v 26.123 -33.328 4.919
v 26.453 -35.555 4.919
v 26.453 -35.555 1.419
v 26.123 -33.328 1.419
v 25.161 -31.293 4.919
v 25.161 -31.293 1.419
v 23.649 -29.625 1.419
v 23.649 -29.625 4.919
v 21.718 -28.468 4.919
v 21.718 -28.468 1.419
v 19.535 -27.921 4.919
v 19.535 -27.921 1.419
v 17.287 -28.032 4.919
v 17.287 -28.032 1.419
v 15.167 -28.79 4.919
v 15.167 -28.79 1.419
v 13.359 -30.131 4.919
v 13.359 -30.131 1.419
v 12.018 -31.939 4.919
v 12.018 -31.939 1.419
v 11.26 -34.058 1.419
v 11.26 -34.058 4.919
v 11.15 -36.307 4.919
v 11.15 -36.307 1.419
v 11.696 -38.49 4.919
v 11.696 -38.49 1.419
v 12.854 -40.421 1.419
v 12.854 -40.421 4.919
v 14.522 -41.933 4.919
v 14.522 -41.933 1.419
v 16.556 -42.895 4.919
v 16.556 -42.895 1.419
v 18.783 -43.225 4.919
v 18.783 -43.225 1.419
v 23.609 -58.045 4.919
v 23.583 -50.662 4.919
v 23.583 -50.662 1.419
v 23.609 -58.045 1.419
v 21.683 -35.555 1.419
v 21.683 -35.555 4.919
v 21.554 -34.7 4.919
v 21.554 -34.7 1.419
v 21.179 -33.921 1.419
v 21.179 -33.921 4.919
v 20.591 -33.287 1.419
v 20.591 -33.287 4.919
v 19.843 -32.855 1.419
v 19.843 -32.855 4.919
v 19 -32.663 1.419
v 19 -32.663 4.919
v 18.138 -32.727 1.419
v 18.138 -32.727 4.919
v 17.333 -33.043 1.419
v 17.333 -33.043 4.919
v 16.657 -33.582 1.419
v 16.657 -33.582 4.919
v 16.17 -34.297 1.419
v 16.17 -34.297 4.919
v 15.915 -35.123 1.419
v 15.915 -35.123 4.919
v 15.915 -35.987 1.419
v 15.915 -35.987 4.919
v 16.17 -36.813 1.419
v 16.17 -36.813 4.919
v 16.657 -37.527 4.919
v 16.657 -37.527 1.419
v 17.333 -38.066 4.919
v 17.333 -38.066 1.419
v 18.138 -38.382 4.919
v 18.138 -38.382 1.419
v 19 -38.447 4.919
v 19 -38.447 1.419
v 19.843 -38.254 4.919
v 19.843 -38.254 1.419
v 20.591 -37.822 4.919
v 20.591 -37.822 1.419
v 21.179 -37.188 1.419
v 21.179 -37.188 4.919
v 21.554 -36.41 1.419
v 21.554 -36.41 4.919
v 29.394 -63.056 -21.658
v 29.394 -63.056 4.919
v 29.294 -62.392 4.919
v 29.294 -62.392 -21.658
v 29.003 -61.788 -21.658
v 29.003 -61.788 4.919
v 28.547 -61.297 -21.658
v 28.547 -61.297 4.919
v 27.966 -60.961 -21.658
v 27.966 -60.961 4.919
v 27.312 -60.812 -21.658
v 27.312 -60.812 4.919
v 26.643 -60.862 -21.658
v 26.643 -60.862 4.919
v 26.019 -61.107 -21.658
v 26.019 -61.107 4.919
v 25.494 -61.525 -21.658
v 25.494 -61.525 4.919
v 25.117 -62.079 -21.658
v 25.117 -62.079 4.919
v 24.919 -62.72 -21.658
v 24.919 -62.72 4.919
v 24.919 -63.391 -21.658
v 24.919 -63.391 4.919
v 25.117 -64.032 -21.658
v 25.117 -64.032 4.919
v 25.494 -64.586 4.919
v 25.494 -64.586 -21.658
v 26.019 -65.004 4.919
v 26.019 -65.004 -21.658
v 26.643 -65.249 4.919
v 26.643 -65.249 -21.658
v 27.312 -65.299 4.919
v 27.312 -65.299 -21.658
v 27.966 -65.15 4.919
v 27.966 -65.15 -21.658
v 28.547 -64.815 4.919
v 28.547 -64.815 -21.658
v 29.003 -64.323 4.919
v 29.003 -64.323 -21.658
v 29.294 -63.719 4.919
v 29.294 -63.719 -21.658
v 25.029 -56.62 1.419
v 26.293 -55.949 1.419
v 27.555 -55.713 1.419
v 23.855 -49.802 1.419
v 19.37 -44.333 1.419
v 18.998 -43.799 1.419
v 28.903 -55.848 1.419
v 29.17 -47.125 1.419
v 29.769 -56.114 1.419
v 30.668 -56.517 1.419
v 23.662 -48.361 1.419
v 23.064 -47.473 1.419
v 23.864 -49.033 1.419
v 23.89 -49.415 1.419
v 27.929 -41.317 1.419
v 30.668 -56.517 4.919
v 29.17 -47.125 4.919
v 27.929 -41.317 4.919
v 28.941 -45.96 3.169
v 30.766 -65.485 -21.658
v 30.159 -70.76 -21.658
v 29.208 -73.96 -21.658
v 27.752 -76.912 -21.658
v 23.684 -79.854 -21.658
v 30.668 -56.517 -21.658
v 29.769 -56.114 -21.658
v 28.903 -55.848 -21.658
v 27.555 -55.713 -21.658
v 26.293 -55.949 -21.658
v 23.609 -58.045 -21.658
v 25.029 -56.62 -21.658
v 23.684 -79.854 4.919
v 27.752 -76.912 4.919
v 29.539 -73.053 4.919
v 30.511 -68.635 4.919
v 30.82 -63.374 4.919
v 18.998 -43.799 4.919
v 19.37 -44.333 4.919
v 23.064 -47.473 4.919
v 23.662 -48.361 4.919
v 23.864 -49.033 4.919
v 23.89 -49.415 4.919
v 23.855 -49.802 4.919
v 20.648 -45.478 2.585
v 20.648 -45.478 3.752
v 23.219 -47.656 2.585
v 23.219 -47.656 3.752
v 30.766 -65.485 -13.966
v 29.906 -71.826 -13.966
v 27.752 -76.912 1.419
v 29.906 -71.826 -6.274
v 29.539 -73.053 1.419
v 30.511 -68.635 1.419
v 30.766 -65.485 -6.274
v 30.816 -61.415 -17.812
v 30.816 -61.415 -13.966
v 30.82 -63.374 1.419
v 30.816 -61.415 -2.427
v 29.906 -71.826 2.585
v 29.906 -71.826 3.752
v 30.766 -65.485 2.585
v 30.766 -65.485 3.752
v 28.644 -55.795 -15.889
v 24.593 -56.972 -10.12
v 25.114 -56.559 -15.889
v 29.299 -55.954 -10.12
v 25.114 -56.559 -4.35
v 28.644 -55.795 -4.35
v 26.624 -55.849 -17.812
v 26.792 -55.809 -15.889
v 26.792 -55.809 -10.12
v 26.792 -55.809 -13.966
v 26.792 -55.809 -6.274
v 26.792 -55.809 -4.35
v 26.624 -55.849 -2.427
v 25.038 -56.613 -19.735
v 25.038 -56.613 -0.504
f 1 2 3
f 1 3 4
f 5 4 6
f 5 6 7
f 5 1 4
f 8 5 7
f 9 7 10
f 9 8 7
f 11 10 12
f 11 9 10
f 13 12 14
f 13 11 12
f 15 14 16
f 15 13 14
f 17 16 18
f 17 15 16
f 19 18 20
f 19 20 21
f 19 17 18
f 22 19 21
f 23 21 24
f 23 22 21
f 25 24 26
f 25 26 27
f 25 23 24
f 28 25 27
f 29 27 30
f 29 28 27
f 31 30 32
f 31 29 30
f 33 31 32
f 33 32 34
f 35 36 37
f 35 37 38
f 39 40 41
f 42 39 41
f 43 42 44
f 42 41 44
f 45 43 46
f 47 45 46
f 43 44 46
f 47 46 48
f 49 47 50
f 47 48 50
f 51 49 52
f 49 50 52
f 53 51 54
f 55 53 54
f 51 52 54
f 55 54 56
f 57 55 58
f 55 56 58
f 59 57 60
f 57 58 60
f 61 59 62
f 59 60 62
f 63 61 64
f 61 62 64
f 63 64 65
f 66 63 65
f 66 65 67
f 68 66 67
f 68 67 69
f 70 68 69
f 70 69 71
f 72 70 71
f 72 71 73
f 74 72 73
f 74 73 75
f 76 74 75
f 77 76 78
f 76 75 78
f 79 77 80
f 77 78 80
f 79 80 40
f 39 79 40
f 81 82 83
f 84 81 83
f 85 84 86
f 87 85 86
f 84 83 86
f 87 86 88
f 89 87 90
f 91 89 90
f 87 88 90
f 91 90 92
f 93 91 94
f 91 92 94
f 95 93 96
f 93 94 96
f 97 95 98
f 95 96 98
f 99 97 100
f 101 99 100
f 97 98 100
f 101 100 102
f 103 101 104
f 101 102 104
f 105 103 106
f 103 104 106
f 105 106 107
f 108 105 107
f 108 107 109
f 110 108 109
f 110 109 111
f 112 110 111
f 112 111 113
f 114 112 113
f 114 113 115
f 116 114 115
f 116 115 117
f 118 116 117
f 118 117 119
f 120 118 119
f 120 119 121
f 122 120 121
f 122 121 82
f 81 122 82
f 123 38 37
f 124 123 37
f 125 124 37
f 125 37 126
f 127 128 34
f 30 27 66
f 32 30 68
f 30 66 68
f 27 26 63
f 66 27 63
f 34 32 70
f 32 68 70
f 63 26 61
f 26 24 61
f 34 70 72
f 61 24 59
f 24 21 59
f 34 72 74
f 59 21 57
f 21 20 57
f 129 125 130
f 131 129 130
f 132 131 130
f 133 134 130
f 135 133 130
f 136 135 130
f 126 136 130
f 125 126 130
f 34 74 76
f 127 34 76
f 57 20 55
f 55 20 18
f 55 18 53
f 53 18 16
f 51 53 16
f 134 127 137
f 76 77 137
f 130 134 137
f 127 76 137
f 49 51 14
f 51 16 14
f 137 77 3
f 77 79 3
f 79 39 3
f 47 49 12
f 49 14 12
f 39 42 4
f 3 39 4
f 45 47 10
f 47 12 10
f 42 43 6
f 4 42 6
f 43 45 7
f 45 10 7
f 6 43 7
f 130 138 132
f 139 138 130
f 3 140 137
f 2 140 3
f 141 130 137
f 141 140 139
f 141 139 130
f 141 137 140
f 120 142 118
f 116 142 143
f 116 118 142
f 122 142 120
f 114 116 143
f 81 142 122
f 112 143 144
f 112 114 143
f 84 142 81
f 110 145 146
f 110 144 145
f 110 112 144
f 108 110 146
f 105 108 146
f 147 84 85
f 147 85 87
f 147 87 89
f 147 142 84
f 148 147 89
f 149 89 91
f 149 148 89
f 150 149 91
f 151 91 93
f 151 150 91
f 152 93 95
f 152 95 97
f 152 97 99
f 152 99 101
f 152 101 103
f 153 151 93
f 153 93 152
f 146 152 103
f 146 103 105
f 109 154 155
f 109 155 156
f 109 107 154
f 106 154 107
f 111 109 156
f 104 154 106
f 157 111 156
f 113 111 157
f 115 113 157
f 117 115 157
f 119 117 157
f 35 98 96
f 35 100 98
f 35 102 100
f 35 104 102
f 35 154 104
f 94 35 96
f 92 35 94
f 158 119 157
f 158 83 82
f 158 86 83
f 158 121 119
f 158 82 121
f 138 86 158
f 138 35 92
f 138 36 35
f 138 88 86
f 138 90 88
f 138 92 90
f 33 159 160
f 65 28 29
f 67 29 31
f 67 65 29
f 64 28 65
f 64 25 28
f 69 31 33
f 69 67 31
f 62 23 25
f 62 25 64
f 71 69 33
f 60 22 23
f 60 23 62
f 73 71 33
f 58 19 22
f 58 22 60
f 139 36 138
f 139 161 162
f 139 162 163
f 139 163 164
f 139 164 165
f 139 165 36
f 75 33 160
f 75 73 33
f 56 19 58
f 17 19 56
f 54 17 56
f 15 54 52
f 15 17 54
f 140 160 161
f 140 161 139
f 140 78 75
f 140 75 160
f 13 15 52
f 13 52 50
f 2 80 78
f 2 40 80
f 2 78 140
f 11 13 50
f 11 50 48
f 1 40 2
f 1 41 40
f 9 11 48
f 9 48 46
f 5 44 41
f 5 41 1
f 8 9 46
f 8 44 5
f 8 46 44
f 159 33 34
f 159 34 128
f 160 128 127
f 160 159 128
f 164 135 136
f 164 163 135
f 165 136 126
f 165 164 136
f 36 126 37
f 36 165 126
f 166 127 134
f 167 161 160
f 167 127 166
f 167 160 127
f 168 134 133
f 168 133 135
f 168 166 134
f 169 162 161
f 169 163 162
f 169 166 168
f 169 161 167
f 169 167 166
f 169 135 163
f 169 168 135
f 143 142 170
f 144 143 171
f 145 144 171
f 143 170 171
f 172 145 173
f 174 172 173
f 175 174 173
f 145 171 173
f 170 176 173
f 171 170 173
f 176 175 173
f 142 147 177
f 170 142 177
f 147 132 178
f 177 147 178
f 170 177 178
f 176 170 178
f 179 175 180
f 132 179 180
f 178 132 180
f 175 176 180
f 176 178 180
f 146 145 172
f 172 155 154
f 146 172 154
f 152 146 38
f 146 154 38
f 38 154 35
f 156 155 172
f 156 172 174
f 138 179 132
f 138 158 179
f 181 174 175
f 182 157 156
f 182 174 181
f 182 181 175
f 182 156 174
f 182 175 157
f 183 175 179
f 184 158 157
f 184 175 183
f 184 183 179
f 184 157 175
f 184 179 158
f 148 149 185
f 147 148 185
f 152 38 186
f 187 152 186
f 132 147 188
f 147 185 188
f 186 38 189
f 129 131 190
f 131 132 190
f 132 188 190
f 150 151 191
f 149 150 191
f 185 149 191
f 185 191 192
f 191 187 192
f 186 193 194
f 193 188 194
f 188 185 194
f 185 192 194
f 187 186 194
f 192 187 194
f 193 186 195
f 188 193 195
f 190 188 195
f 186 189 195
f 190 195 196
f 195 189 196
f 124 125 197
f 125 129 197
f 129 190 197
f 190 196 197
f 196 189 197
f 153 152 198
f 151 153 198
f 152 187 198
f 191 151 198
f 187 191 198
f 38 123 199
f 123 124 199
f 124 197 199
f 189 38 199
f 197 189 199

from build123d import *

# Parameters (mm, degrees)
SKETCH1_R           = 2.9
BOSS_EXTRUDE1_DEPTH = 3.5
BOSS_EXTRUDE2_DEPTH = 23.076867
SKETCH3_R           = 2.25
CUT_EXTRUDE1_DEPTH  = 90.627435024


with BuildPart() as part:
    # Sketch1 → Boss-Extrude1 (new body)
    with BuildSketch(Plane.XY.offset(4.918735516)):
        with BuildLine():
            Line((23.684222564, -79.854061858), (27.751665024, -76.911614194))
            add(Edge.make_bspline(
                [(27.751665024, -76.911614194), (30.665612651, -71.996437575), (31.13217948, -67.256532156), (30.668059578, -56.517089881)],
                knots=[0.222415535, 0.222415535, 0.222415535, 0.222415535, 0.766682965, 0.766682965, 0.766682965, 0.766682965], degree=3))
            add(Edge.make_bspline(
                [(30.668059578, -56.517089881), (29.320428981, -45.88374403), (26.453494832, -35.554786486)],
                knots=[0, 0, 0, 1, 1, 1], degree=2))
            ThreePointArc((26.453494832, -35.554786486), (13.359197662, -30.130951008), (18.783033139, -43.225248178))
            add(Edge.make_bspline(
                [(18.783033139, -43.225248178), (19.322772584, -45.817228322), (25.294082339, -46.94058971), (23.583083134, -50.662102957)],
                knots=[0, 0, 0, 0, 1, 1, 1, 1], degree=3))
            Line((23.583083134, -50.662102957), (23.608661583, -58.04483203))
            Line((23.608661583, -58.04483203), (23.684222564, -79.854061858))
        make_face()
        with Locations((18.783033139, -35.554786486)):
            Circle(SKETCH1_R, mode=Mode.SUBTRACT)
    extrude(amount=-BOSS_EXTRUDE1_DEPTH)

    # Sketch2 → Boss-Extrude2 (add)
    with BuildSketch(Plane(origin=(0, 0, 1.418735516), x_dir=(-1, 0, 0), z_dir=(0, 0, -1))):
        with BuildLine():
            Line((-27.751665024, -76.911614194), (-23.684222564, -79.854061858))
            Line((-23.684222564, -79.854061858), (-23.608661583, -58.04483203))
            add(Edge.make_bspline(
                [(-23.608661583, -58.04483203), (-26.446360253, -54.336432943), (-30.668059578, -56.51708988)],
                knots=[0, 0, 0, 1, 1, 1], degree=2))
            add(Edge.make_bspline(
                [(-30.668059578, -56.51708988), (-31.132179479, -67.256532155), (-30.665612651, -71.996437575), (-27.751665024, -76.911614194)],
                knots=[0.222415535, 0.222415535, 0.222415535, 0.222415535, 0.766682965, 0.766682965, 0.766682965, 0.766682965], degree=3))
        make_face()
    extrude(amount=BOSS_EXTRUDE2_DEPTH)

    # Sketch3 → Cut-Extrude1 (cut, through all)
    with BuildSketch(Plane.XY.offset(4.918735516)):
        with Locations((27.143723241, -63.055671712)):
            Circle(SKETCH3_R)
    extrude(amount=-CUT_EXTRUDE1_DEPTH, mode=Mode.SUBTRACT)


solid = part.part
